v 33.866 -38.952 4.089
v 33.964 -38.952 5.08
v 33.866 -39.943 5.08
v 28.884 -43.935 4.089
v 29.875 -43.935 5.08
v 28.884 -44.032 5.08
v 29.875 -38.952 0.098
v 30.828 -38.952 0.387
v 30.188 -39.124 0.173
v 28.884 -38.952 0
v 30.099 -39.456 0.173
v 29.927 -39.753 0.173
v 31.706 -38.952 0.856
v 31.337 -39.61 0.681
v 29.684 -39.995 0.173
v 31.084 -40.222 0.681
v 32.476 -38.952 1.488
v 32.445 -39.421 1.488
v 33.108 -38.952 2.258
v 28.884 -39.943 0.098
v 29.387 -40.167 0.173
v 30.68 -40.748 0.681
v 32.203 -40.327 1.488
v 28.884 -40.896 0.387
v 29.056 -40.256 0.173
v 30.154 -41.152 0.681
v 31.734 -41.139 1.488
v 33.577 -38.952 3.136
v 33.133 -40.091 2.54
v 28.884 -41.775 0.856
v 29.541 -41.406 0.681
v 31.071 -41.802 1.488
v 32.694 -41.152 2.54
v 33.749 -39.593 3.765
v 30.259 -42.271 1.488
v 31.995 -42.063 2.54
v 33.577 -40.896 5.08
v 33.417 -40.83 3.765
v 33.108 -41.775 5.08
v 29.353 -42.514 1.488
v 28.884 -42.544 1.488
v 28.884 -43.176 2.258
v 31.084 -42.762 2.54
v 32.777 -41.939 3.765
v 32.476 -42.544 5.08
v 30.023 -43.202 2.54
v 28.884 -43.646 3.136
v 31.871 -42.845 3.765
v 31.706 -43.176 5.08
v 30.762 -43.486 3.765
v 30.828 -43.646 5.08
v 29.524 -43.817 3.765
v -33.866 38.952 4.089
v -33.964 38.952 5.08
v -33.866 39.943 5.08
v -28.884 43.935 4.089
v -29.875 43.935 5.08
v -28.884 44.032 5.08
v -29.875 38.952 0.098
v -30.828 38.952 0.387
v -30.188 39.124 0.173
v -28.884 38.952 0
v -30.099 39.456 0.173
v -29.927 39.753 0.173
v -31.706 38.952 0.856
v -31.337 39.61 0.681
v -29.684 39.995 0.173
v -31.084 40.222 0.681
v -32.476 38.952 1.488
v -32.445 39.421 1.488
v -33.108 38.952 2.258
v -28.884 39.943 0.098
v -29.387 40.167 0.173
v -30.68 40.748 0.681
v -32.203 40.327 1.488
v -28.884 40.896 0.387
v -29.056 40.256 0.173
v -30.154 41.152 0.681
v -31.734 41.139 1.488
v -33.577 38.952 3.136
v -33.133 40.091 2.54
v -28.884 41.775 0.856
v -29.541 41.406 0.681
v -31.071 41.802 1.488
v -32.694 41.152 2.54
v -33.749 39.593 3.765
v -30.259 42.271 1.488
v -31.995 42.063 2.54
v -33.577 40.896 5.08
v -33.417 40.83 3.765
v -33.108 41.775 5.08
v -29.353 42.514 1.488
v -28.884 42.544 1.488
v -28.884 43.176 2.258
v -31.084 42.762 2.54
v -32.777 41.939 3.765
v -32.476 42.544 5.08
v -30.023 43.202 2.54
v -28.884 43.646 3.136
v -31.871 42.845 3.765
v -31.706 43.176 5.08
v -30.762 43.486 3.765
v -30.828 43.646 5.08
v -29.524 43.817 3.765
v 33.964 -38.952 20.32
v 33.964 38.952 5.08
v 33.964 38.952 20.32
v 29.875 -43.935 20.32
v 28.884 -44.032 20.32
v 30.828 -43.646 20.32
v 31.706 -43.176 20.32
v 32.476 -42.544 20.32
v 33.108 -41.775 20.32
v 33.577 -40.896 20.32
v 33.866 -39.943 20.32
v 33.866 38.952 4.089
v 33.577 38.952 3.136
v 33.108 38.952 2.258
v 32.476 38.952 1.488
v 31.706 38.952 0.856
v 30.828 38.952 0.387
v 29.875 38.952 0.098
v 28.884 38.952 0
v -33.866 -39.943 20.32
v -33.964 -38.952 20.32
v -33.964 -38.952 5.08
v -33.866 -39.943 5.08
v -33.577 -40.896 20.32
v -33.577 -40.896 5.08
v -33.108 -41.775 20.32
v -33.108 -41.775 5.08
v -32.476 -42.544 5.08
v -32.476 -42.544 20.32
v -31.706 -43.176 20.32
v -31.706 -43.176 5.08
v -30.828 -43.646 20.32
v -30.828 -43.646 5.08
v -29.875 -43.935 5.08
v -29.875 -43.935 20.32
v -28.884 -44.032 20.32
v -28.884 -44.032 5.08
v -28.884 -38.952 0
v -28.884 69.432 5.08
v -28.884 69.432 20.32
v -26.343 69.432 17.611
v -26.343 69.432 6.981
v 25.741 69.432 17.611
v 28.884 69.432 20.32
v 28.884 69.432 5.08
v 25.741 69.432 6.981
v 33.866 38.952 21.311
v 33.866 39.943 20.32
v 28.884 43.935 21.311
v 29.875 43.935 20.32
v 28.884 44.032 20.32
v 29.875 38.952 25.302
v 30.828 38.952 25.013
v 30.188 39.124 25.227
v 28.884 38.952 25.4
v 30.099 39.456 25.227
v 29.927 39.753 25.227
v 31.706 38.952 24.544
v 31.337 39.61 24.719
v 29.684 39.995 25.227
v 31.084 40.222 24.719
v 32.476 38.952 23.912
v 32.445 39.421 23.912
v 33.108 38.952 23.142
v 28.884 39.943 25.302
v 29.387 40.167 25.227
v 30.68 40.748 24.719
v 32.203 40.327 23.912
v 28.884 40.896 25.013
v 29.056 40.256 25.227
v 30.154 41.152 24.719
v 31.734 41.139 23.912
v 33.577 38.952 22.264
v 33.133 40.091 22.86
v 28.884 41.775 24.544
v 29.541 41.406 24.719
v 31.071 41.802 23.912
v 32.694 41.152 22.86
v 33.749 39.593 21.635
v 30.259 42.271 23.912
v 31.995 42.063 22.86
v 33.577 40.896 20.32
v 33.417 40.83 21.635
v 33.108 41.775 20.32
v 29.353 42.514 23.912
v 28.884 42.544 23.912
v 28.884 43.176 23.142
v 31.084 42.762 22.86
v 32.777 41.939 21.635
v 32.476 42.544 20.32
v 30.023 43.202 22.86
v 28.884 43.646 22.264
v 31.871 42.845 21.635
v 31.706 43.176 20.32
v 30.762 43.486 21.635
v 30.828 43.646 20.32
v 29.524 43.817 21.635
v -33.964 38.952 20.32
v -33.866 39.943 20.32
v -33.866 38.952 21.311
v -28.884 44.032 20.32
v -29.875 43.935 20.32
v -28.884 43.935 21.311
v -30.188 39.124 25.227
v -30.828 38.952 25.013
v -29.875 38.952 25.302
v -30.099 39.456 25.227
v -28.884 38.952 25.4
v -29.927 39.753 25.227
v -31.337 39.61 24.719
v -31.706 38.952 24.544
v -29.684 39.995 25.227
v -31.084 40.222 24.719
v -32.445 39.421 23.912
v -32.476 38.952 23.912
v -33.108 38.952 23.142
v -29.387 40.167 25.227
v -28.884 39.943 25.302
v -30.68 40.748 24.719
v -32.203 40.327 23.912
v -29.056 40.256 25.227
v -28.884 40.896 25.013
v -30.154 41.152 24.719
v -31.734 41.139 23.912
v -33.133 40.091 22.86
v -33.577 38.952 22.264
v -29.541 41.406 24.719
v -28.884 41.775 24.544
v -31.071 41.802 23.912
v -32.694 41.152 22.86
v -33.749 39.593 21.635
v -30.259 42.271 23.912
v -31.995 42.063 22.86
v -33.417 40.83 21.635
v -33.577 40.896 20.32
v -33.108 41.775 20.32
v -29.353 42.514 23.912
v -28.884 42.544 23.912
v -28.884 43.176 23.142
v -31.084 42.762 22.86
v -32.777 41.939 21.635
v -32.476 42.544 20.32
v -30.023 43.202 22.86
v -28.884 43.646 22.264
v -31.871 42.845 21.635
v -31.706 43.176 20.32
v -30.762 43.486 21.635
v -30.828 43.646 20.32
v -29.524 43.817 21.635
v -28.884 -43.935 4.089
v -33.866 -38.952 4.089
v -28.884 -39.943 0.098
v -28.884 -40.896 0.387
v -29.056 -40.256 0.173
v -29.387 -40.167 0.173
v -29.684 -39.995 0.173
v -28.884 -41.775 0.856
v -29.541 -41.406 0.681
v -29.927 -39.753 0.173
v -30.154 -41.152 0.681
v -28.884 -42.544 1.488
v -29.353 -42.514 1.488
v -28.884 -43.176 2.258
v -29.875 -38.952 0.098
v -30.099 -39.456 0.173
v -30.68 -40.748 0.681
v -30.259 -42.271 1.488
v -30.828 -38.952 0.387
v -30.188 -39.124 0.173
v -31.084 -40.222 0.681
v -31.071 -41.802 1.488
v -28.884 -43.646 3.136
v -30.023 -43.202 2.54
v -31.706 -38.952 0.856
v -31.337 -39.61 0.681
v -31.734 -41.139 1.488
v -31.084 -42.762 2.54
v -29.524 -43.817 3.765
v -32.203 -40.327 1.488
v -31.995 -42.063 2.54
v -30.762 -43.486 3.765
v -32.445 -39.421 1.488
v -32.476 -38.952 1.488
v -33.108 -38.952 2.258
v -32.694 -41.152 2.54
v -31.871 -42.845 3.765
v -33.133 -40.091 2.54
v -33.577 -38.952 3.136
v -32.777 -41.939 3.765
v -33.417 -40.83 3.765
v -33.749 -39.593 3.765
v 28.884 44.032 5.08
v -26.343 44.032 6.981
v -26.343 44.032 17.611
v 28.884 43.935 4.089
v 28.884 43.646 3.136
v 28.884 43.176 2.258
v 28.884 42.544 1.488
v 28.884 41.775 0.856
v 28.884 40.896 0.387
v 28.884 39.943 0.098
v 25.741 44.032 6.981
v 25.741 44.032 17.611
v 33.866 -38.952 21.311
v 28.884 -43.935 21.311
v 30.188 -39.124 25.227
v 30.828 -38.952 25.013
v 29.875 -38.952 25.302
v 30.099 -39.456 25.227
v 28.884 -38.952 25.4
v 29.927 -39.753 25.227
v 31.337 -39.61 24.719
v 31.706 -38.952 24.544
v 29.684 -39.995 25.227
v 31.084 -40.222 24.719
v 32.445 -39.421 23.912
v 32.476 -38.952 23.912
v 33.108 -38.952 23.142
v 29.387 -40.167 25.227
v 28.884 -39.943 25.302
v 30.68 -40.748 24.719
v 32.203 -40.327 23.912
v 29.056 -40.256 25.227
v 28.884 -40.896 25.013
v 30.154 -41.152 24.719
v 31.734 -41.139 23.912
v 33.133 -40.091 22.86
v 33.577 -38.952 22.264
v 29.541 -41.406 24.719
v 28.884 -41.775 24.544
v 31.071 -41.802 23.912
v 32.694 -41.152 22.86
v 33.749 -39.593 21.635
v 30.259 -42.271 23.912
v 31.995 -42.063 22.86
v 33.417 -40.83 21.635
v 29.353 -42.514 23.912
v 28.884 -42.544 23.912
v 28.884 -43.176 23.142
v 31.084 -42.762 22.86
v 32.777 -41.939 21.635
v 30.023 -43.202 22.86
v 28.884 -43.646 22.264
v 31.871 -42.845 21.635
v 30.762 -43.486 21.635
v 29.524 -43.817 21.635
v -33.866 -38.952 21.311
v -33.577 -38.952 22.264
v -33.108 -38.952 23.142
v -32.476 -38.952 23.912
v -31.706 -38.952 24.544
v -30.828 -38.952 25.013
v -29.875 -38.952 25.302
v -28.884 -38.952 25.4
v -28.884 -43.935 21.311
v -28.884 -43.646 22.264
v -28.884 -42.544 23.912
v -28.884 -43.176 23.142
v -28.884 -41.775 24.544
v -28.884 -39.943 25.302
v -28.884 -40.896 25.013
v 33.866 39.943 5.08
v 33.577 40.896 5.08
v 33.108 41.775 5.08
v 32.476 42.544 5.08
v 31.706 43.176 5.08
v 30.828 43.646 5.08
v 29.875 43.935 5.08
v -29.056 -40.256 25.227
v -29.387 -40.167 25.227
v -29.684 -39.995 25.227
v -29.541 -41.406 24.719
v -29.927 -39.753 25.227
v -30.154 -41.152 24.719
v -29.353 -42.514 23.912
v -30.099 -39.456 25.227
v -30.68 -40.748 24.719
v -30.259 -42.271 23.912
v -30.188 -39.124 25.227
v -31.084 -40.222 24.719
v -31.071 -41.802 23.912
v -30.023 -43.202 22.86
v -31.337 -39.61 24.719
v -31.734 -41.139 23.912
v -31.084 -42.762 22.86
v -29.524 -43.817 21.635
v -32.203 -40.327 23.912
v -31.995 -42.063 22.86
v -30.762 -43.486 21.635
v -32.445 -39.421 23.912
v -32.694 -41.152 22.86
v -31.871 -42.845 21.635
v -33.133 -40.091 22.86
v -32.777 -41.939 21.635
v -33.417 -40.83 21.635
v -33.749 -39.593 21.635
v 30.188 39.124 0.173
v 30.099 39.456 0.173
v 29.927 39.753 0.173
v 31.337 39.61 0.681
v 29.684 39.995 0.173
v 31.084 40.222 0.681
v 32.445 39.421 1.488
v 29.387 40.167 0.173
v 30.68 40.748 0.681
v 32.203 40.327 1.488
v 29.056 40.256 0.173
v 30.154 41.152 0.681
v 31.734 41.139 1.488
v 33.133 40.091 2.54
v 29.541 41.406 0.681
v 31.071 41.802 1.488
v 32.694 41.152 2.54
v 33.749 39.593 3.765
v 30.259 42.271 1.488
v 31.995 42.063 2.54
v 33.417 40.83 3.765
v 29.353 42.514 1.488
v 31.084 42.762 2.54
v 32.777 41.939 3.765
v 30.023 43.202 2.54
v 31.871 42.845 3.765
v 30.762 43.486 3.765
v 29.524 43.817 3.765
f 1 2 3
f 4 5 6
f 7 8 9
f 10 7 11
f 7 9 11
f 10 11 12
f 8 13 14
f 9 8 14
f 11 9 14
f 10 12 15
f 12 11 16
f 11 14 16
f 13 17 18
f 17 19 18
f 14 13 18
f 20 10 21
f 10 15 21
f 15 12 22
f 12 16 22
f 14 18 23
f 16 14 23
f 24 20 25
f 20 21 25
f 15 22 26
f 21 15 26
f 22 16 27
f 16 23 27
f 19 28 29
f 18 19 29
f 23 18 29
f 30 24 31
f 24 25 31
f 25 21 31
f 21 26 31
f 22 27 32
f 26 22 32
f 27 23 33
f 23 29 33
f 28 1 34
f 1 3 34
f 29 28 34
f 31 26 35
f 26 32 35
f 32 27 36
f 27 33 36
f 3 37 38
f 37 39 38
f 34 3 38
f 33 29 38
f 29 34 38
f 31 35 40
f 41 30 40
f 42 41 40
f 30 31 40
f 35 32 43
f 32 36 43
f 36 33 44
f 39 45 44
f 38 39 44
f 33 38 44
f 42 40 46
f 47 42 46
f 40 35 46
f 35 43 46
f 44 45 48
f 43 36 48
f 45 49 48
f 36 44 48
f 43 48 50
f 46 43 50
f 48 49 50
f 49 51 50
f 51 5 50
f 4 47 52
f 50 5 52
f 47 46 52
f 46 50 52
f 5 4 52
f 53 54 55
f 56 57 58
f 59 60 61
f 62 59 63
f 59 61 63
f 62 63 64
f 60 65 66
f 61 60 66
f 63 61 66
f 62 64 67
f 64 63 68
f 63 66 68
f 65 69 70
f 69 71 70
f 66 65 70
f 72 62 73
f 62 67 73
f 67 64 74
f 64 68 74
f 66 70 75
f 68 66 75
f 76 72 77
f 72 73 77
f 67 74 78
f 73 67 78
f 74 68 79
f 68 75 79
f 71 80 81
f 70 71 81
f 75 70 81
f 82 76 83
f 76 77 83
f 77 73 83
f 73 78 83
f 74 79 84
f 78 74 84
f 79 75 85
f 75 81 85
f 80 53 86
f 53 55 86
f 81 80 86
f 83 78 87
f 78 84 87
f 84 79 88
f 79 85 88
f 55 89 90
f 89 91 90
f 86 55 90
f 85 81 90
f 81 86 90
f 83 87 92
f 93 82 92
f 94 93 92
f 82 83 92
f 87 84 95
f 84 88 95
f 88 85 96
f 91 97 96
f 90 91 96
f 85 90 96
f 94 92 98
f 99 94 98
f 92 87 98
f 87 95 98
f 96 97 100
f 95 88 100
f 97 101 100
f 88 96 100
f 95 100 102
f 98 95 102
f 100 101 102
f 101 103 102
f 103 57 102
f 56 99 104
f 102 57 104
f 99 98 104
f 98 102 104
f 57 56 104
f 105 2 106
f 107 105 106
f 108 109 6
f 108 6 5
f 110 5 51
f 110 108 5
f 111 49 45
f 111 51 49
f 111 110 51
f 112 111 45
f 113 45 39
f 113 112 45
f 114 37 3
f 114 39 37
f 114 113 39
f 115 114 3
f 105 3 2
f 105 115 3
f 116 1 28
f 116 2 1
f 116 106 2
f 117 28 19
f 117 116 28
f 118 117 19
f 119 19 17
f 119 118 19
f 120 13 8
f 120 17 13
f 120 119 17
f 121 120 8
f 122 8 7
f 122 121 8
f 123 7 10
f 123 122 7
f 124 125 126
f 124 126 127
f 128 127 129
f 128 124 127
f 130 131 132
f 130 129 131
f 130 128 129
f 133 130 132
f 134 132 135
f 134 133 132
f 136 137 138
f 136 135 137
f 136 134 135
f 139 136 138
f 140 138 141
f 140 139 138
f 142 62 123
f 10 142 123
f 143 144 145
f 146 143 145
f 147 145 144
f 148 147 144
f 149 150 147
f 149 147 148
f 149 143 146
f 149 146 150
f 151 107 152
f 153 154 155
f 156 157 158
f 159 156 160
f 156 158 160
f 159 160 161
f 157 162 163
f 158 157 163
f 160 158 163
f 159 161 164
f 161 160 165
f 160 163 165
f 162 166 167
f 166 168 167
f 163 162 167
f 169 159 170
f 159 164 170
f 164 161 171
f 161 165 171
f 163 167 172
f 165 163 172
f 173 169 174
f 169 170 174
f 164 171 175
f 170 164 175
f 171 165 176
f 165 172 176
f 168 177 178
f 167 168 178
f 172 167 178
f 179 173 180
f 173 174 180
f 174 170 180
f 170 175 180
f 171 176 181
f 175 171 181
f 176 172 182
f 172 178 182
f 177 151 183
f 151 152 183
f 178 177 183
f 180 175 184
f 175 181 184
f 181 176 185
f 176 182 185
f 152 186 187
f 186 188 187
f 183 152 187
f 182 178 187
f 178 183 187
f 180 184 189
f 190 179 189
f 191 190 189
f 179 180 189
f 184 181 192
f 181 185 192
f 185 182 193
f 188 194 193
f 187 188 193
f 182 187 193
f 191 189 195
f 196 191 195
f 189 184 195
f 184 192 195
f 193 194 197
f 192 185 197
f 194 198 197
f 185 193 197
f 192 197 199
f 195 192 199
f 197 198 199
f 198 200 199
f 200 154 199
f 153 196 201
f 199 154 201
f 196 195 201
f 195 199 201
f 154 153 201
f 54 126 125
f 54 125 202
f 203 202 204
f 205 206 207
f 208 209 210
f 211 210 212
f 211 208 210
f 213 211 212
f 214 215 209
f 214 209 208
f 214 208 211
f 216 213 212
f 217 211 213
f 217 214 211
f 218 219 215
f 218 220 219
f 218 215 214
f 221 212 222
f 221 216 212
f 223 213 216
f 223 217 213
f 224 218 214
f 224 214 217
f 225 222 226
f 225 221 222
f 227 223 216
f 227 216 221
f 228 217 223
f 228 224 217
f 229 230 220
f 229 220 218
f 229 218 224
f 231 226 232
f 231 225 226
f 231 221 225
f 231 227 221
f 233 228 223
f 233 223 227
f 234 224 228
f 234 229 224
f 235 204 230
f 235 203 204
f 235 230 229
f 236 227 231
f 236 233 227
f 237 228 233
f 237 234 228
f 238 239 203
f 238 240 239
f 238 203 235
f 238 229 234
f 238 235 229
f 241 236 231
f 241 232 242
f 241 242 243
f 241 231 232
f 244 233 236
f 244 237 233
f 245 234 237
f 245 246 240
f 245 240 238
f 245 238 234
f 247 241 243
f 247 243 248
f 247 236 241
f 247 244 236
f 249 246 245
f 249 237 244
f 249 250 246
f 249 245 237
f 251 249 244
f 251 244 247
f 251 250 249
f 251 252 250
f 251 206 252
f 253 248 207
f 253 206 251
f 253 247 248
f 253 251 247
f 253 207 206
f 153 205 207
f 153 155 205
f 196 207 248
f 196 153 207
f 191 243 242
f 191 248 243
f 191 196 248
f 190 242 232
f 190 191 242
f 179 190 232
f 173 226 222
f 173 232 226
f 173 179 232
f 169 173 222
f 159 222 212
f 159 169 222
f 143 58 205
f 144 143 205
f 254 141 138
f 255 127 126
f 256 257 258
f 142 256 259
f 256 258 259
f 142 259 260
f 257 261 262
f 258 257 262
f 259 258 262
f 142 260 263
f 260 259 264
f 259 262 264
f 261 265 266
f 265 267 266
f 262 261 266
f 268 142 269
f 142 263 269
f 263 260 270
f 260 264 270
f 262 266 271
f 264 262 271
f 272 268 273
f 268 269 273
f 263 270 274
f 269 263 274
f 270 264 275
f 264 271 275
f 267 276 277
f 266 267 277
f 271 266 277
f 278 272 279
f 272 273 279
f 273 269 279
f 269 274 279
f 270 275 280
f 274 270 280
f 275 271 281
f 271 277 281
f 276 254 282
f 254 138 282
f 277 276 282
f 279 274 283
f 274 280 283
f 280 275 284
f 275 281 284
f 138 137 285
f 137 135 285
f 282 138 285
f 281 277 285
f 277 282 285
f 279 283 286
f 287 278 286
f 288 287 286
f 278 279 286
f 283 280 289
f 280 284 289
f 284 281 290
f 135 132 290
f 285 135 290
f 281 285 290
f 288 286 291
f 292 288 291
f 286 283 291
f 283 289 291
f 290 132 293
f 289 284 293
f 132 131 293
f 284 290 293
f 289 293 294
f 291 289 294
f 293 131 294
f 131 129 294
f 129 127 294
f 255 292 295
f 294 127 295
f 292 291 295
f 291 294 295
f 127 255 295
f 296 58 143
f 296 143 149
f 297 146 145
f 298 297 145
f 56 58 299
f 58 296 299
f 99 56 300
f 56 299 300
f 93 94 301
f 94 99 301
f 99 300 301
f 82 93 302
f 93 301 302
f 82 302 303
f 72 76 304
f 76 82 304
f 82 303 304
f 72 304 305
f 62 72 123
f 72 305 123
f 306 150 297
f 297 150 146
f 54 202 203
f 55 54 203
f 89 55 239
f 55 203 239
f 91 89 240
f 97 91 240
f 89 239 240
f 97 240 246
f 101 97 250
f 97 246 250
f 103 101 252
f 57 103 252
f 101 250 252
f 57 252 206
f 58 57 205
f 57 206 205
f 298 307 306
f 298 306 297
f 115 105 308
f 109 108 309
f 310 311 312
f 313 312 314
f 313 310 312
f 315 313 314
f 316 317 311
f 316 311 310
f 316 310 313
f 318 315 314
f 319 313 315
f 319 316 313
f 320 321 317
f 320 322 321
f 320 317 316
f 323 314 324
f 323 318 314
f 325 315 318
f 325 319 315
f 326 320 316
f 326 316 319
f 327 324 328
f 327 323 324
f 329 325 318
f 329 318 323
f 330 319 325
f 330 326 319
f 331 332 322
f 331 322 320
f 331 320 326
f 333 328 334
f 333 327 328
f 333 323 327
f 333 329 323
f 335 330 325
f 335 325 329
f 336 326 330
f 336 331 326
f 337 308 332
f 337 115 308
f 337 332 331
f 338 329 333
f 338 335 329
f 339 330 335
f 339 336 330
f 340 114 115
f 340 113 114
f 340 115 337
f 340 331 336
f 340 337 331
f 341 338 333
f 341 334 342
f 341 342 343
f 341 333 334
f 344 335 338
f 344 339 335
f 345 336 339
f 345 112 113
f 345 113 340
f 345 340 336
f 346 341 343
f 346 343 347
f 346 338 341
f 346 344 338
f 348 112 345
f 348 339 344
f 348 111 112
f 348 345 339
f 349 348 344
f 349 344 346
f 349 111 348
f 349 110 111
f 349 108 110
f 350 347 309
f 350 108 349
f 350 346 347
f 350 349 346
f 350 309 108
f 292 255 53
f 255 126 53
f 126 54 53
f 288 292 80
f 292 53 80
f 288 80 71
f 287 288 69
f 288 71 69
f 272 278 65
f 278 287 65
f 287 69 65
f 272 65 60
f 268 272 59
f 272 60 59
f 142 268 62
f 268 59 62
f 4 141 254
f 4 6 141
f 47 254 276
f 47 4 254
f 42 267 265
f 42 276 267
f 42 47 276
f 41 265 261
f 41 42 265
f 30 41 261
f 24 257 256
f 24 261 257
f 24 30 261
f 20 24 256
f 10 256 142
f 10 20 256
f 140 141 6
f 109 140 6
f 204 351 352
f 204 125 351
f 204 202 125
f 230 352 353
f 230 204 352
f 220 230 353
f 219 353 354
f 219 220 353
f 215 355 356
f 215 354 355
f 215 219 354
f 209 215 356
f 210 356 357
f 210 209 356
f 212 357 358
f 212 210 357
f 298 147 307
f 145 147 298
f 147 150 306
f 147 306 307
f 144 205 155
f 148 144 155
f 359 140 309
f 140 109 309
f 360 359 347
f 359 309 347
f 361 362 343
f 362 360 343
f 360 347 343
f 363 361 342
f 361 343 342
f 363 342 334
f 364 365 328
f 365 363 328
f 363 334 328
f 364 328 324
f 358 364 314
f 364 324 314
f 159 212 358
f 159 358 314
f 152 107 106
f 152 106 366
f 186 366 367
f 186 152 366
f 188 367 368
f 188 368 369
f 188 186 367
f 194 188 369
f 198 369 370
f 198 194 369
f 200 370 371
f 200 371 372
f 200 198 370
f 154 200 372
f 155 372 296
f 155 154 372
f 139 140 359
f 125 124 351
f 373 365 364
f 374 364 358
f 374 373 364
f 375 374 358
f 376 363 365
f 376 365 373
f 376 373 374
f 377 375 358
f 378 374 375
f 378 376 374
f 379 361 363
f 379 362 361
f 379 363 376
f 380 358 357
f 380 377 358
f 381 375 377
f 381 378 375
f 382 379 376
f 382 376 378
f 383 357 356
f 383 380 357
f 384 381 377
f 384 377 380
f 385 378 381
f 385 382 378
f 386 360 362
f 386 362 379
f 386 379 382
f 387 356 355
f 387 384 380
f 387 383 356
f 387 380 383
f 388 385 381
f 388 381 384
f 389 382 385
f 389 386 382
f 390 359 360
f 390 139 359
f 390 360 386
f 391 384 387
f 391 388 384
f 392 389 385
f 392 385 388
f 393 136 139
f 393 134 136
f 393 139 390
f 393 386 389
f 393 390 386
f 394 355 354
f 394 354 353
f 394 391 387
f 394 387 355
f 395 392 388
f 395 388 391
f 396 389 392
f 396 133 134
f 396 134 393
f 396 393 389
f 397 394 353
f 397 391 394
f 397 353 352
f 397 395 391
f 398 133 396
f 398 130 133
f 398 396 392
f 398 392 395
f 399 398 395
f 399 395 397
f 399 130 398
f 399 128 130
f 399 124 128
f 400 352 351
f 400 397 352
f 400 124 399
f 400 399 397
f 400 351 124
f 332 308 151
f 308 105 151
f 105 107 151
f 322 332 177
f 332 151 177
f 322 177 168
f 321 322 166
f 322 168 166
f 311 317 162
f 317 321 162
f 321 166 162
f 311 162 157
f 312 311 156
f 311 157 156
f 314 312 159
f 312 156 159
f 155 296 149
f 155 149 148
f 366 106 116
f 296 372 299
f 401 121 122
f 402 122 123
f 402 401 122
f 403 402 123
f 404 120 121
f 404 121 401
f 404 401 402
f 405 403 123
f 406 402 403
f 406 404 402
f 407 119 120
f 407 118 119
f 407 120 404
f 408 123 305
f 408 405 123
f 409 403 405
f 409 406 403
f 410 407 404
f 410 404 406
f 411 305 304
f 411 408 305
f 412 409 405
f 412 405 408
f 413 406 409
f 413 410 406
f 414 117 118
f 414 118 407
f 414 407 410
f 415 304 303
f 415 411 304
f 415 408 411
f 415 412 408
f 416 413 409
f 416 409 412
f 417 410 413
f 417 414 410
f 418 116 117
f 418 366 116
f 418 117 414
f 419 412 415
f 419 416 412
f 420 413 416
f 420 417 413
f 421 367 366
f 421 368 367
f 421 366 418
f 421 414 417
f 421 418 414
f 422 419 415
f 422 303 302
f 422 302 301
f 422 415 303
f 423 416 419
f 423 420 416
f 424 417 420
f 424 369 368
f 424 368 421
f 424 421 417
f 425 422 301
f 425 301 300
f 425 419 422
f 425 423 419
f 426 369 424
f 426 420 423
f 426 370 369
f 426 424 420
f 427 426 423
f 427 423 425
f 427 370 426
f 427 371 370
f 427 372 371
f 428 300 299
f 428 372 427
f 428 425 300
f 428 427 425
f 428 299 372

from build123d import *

# Parameters (mm, degrees)
F0_W     = 67.9279565811
F0_H     = 88.0647003651
F1_DEPTH = 25.4
F2_R     = 5.08
F3_DEPTH = 25.4
F4_W     = 52.0835686475
F4_H     = 10.6304162182
F5_DEPTH = 25.4


# Not quite as in the source:
# - a feature of the source that left no trace in its solid (it failed there, or was rolled back) is left out


with BuildPart() as f1:
    # F0 (on Top) → F1 (new body)
    with BuildSketch(Plane.XY):
        Rectangle(F0_W, F0_H)
    extrude(amount=F1_DEPTH)

    # F2
    f2_edges = [f1.edges().sort_by_distance(p)[0] for p in [
        (33.963978, -44.03235, 12.7),
        (33.963978, 44.03235, 12.7),
        (33.963978, 0, 0),
        (33.963978, 0, 25.4),
        (-33.963978, -44.03235, 12.7),
        (0, -44.03235, 0),
        (0, -44.03235, 25.4),
        (-33.963978, 44.03235, 12.7),
        (-33.963978, 0, 0),
        (-33.963978, 0, 25.4),
        (0, 44.03235, 0),
        (0, 44.03235, 25.4),
    ]]
    fillet(f2_edges, radius=F2_R)

    # F3 (add): a face of the model
    f3_faces = [f1.faces().sort_by_distance(p)[0] for p in [
        (0, 44.0323501825, 12.7),
    ]]
    extrude(f3_faces, amount=F3_DEPTH)

    # F4 (on face) → F5 (cut)
    with BuildSketch(Plane(origin=(0, 69.4323501825, 0), x_dir=(-1, 0, 0), z_dir=(0, 1, 0))):
        with Locations((0.3008237109, 12.2958261054)):
            Rectangle(F4_W, F4_H)
    extrude(amount=-F5_DEPTH, mode=Mode.SUBTRACT)


solid = f1.part
